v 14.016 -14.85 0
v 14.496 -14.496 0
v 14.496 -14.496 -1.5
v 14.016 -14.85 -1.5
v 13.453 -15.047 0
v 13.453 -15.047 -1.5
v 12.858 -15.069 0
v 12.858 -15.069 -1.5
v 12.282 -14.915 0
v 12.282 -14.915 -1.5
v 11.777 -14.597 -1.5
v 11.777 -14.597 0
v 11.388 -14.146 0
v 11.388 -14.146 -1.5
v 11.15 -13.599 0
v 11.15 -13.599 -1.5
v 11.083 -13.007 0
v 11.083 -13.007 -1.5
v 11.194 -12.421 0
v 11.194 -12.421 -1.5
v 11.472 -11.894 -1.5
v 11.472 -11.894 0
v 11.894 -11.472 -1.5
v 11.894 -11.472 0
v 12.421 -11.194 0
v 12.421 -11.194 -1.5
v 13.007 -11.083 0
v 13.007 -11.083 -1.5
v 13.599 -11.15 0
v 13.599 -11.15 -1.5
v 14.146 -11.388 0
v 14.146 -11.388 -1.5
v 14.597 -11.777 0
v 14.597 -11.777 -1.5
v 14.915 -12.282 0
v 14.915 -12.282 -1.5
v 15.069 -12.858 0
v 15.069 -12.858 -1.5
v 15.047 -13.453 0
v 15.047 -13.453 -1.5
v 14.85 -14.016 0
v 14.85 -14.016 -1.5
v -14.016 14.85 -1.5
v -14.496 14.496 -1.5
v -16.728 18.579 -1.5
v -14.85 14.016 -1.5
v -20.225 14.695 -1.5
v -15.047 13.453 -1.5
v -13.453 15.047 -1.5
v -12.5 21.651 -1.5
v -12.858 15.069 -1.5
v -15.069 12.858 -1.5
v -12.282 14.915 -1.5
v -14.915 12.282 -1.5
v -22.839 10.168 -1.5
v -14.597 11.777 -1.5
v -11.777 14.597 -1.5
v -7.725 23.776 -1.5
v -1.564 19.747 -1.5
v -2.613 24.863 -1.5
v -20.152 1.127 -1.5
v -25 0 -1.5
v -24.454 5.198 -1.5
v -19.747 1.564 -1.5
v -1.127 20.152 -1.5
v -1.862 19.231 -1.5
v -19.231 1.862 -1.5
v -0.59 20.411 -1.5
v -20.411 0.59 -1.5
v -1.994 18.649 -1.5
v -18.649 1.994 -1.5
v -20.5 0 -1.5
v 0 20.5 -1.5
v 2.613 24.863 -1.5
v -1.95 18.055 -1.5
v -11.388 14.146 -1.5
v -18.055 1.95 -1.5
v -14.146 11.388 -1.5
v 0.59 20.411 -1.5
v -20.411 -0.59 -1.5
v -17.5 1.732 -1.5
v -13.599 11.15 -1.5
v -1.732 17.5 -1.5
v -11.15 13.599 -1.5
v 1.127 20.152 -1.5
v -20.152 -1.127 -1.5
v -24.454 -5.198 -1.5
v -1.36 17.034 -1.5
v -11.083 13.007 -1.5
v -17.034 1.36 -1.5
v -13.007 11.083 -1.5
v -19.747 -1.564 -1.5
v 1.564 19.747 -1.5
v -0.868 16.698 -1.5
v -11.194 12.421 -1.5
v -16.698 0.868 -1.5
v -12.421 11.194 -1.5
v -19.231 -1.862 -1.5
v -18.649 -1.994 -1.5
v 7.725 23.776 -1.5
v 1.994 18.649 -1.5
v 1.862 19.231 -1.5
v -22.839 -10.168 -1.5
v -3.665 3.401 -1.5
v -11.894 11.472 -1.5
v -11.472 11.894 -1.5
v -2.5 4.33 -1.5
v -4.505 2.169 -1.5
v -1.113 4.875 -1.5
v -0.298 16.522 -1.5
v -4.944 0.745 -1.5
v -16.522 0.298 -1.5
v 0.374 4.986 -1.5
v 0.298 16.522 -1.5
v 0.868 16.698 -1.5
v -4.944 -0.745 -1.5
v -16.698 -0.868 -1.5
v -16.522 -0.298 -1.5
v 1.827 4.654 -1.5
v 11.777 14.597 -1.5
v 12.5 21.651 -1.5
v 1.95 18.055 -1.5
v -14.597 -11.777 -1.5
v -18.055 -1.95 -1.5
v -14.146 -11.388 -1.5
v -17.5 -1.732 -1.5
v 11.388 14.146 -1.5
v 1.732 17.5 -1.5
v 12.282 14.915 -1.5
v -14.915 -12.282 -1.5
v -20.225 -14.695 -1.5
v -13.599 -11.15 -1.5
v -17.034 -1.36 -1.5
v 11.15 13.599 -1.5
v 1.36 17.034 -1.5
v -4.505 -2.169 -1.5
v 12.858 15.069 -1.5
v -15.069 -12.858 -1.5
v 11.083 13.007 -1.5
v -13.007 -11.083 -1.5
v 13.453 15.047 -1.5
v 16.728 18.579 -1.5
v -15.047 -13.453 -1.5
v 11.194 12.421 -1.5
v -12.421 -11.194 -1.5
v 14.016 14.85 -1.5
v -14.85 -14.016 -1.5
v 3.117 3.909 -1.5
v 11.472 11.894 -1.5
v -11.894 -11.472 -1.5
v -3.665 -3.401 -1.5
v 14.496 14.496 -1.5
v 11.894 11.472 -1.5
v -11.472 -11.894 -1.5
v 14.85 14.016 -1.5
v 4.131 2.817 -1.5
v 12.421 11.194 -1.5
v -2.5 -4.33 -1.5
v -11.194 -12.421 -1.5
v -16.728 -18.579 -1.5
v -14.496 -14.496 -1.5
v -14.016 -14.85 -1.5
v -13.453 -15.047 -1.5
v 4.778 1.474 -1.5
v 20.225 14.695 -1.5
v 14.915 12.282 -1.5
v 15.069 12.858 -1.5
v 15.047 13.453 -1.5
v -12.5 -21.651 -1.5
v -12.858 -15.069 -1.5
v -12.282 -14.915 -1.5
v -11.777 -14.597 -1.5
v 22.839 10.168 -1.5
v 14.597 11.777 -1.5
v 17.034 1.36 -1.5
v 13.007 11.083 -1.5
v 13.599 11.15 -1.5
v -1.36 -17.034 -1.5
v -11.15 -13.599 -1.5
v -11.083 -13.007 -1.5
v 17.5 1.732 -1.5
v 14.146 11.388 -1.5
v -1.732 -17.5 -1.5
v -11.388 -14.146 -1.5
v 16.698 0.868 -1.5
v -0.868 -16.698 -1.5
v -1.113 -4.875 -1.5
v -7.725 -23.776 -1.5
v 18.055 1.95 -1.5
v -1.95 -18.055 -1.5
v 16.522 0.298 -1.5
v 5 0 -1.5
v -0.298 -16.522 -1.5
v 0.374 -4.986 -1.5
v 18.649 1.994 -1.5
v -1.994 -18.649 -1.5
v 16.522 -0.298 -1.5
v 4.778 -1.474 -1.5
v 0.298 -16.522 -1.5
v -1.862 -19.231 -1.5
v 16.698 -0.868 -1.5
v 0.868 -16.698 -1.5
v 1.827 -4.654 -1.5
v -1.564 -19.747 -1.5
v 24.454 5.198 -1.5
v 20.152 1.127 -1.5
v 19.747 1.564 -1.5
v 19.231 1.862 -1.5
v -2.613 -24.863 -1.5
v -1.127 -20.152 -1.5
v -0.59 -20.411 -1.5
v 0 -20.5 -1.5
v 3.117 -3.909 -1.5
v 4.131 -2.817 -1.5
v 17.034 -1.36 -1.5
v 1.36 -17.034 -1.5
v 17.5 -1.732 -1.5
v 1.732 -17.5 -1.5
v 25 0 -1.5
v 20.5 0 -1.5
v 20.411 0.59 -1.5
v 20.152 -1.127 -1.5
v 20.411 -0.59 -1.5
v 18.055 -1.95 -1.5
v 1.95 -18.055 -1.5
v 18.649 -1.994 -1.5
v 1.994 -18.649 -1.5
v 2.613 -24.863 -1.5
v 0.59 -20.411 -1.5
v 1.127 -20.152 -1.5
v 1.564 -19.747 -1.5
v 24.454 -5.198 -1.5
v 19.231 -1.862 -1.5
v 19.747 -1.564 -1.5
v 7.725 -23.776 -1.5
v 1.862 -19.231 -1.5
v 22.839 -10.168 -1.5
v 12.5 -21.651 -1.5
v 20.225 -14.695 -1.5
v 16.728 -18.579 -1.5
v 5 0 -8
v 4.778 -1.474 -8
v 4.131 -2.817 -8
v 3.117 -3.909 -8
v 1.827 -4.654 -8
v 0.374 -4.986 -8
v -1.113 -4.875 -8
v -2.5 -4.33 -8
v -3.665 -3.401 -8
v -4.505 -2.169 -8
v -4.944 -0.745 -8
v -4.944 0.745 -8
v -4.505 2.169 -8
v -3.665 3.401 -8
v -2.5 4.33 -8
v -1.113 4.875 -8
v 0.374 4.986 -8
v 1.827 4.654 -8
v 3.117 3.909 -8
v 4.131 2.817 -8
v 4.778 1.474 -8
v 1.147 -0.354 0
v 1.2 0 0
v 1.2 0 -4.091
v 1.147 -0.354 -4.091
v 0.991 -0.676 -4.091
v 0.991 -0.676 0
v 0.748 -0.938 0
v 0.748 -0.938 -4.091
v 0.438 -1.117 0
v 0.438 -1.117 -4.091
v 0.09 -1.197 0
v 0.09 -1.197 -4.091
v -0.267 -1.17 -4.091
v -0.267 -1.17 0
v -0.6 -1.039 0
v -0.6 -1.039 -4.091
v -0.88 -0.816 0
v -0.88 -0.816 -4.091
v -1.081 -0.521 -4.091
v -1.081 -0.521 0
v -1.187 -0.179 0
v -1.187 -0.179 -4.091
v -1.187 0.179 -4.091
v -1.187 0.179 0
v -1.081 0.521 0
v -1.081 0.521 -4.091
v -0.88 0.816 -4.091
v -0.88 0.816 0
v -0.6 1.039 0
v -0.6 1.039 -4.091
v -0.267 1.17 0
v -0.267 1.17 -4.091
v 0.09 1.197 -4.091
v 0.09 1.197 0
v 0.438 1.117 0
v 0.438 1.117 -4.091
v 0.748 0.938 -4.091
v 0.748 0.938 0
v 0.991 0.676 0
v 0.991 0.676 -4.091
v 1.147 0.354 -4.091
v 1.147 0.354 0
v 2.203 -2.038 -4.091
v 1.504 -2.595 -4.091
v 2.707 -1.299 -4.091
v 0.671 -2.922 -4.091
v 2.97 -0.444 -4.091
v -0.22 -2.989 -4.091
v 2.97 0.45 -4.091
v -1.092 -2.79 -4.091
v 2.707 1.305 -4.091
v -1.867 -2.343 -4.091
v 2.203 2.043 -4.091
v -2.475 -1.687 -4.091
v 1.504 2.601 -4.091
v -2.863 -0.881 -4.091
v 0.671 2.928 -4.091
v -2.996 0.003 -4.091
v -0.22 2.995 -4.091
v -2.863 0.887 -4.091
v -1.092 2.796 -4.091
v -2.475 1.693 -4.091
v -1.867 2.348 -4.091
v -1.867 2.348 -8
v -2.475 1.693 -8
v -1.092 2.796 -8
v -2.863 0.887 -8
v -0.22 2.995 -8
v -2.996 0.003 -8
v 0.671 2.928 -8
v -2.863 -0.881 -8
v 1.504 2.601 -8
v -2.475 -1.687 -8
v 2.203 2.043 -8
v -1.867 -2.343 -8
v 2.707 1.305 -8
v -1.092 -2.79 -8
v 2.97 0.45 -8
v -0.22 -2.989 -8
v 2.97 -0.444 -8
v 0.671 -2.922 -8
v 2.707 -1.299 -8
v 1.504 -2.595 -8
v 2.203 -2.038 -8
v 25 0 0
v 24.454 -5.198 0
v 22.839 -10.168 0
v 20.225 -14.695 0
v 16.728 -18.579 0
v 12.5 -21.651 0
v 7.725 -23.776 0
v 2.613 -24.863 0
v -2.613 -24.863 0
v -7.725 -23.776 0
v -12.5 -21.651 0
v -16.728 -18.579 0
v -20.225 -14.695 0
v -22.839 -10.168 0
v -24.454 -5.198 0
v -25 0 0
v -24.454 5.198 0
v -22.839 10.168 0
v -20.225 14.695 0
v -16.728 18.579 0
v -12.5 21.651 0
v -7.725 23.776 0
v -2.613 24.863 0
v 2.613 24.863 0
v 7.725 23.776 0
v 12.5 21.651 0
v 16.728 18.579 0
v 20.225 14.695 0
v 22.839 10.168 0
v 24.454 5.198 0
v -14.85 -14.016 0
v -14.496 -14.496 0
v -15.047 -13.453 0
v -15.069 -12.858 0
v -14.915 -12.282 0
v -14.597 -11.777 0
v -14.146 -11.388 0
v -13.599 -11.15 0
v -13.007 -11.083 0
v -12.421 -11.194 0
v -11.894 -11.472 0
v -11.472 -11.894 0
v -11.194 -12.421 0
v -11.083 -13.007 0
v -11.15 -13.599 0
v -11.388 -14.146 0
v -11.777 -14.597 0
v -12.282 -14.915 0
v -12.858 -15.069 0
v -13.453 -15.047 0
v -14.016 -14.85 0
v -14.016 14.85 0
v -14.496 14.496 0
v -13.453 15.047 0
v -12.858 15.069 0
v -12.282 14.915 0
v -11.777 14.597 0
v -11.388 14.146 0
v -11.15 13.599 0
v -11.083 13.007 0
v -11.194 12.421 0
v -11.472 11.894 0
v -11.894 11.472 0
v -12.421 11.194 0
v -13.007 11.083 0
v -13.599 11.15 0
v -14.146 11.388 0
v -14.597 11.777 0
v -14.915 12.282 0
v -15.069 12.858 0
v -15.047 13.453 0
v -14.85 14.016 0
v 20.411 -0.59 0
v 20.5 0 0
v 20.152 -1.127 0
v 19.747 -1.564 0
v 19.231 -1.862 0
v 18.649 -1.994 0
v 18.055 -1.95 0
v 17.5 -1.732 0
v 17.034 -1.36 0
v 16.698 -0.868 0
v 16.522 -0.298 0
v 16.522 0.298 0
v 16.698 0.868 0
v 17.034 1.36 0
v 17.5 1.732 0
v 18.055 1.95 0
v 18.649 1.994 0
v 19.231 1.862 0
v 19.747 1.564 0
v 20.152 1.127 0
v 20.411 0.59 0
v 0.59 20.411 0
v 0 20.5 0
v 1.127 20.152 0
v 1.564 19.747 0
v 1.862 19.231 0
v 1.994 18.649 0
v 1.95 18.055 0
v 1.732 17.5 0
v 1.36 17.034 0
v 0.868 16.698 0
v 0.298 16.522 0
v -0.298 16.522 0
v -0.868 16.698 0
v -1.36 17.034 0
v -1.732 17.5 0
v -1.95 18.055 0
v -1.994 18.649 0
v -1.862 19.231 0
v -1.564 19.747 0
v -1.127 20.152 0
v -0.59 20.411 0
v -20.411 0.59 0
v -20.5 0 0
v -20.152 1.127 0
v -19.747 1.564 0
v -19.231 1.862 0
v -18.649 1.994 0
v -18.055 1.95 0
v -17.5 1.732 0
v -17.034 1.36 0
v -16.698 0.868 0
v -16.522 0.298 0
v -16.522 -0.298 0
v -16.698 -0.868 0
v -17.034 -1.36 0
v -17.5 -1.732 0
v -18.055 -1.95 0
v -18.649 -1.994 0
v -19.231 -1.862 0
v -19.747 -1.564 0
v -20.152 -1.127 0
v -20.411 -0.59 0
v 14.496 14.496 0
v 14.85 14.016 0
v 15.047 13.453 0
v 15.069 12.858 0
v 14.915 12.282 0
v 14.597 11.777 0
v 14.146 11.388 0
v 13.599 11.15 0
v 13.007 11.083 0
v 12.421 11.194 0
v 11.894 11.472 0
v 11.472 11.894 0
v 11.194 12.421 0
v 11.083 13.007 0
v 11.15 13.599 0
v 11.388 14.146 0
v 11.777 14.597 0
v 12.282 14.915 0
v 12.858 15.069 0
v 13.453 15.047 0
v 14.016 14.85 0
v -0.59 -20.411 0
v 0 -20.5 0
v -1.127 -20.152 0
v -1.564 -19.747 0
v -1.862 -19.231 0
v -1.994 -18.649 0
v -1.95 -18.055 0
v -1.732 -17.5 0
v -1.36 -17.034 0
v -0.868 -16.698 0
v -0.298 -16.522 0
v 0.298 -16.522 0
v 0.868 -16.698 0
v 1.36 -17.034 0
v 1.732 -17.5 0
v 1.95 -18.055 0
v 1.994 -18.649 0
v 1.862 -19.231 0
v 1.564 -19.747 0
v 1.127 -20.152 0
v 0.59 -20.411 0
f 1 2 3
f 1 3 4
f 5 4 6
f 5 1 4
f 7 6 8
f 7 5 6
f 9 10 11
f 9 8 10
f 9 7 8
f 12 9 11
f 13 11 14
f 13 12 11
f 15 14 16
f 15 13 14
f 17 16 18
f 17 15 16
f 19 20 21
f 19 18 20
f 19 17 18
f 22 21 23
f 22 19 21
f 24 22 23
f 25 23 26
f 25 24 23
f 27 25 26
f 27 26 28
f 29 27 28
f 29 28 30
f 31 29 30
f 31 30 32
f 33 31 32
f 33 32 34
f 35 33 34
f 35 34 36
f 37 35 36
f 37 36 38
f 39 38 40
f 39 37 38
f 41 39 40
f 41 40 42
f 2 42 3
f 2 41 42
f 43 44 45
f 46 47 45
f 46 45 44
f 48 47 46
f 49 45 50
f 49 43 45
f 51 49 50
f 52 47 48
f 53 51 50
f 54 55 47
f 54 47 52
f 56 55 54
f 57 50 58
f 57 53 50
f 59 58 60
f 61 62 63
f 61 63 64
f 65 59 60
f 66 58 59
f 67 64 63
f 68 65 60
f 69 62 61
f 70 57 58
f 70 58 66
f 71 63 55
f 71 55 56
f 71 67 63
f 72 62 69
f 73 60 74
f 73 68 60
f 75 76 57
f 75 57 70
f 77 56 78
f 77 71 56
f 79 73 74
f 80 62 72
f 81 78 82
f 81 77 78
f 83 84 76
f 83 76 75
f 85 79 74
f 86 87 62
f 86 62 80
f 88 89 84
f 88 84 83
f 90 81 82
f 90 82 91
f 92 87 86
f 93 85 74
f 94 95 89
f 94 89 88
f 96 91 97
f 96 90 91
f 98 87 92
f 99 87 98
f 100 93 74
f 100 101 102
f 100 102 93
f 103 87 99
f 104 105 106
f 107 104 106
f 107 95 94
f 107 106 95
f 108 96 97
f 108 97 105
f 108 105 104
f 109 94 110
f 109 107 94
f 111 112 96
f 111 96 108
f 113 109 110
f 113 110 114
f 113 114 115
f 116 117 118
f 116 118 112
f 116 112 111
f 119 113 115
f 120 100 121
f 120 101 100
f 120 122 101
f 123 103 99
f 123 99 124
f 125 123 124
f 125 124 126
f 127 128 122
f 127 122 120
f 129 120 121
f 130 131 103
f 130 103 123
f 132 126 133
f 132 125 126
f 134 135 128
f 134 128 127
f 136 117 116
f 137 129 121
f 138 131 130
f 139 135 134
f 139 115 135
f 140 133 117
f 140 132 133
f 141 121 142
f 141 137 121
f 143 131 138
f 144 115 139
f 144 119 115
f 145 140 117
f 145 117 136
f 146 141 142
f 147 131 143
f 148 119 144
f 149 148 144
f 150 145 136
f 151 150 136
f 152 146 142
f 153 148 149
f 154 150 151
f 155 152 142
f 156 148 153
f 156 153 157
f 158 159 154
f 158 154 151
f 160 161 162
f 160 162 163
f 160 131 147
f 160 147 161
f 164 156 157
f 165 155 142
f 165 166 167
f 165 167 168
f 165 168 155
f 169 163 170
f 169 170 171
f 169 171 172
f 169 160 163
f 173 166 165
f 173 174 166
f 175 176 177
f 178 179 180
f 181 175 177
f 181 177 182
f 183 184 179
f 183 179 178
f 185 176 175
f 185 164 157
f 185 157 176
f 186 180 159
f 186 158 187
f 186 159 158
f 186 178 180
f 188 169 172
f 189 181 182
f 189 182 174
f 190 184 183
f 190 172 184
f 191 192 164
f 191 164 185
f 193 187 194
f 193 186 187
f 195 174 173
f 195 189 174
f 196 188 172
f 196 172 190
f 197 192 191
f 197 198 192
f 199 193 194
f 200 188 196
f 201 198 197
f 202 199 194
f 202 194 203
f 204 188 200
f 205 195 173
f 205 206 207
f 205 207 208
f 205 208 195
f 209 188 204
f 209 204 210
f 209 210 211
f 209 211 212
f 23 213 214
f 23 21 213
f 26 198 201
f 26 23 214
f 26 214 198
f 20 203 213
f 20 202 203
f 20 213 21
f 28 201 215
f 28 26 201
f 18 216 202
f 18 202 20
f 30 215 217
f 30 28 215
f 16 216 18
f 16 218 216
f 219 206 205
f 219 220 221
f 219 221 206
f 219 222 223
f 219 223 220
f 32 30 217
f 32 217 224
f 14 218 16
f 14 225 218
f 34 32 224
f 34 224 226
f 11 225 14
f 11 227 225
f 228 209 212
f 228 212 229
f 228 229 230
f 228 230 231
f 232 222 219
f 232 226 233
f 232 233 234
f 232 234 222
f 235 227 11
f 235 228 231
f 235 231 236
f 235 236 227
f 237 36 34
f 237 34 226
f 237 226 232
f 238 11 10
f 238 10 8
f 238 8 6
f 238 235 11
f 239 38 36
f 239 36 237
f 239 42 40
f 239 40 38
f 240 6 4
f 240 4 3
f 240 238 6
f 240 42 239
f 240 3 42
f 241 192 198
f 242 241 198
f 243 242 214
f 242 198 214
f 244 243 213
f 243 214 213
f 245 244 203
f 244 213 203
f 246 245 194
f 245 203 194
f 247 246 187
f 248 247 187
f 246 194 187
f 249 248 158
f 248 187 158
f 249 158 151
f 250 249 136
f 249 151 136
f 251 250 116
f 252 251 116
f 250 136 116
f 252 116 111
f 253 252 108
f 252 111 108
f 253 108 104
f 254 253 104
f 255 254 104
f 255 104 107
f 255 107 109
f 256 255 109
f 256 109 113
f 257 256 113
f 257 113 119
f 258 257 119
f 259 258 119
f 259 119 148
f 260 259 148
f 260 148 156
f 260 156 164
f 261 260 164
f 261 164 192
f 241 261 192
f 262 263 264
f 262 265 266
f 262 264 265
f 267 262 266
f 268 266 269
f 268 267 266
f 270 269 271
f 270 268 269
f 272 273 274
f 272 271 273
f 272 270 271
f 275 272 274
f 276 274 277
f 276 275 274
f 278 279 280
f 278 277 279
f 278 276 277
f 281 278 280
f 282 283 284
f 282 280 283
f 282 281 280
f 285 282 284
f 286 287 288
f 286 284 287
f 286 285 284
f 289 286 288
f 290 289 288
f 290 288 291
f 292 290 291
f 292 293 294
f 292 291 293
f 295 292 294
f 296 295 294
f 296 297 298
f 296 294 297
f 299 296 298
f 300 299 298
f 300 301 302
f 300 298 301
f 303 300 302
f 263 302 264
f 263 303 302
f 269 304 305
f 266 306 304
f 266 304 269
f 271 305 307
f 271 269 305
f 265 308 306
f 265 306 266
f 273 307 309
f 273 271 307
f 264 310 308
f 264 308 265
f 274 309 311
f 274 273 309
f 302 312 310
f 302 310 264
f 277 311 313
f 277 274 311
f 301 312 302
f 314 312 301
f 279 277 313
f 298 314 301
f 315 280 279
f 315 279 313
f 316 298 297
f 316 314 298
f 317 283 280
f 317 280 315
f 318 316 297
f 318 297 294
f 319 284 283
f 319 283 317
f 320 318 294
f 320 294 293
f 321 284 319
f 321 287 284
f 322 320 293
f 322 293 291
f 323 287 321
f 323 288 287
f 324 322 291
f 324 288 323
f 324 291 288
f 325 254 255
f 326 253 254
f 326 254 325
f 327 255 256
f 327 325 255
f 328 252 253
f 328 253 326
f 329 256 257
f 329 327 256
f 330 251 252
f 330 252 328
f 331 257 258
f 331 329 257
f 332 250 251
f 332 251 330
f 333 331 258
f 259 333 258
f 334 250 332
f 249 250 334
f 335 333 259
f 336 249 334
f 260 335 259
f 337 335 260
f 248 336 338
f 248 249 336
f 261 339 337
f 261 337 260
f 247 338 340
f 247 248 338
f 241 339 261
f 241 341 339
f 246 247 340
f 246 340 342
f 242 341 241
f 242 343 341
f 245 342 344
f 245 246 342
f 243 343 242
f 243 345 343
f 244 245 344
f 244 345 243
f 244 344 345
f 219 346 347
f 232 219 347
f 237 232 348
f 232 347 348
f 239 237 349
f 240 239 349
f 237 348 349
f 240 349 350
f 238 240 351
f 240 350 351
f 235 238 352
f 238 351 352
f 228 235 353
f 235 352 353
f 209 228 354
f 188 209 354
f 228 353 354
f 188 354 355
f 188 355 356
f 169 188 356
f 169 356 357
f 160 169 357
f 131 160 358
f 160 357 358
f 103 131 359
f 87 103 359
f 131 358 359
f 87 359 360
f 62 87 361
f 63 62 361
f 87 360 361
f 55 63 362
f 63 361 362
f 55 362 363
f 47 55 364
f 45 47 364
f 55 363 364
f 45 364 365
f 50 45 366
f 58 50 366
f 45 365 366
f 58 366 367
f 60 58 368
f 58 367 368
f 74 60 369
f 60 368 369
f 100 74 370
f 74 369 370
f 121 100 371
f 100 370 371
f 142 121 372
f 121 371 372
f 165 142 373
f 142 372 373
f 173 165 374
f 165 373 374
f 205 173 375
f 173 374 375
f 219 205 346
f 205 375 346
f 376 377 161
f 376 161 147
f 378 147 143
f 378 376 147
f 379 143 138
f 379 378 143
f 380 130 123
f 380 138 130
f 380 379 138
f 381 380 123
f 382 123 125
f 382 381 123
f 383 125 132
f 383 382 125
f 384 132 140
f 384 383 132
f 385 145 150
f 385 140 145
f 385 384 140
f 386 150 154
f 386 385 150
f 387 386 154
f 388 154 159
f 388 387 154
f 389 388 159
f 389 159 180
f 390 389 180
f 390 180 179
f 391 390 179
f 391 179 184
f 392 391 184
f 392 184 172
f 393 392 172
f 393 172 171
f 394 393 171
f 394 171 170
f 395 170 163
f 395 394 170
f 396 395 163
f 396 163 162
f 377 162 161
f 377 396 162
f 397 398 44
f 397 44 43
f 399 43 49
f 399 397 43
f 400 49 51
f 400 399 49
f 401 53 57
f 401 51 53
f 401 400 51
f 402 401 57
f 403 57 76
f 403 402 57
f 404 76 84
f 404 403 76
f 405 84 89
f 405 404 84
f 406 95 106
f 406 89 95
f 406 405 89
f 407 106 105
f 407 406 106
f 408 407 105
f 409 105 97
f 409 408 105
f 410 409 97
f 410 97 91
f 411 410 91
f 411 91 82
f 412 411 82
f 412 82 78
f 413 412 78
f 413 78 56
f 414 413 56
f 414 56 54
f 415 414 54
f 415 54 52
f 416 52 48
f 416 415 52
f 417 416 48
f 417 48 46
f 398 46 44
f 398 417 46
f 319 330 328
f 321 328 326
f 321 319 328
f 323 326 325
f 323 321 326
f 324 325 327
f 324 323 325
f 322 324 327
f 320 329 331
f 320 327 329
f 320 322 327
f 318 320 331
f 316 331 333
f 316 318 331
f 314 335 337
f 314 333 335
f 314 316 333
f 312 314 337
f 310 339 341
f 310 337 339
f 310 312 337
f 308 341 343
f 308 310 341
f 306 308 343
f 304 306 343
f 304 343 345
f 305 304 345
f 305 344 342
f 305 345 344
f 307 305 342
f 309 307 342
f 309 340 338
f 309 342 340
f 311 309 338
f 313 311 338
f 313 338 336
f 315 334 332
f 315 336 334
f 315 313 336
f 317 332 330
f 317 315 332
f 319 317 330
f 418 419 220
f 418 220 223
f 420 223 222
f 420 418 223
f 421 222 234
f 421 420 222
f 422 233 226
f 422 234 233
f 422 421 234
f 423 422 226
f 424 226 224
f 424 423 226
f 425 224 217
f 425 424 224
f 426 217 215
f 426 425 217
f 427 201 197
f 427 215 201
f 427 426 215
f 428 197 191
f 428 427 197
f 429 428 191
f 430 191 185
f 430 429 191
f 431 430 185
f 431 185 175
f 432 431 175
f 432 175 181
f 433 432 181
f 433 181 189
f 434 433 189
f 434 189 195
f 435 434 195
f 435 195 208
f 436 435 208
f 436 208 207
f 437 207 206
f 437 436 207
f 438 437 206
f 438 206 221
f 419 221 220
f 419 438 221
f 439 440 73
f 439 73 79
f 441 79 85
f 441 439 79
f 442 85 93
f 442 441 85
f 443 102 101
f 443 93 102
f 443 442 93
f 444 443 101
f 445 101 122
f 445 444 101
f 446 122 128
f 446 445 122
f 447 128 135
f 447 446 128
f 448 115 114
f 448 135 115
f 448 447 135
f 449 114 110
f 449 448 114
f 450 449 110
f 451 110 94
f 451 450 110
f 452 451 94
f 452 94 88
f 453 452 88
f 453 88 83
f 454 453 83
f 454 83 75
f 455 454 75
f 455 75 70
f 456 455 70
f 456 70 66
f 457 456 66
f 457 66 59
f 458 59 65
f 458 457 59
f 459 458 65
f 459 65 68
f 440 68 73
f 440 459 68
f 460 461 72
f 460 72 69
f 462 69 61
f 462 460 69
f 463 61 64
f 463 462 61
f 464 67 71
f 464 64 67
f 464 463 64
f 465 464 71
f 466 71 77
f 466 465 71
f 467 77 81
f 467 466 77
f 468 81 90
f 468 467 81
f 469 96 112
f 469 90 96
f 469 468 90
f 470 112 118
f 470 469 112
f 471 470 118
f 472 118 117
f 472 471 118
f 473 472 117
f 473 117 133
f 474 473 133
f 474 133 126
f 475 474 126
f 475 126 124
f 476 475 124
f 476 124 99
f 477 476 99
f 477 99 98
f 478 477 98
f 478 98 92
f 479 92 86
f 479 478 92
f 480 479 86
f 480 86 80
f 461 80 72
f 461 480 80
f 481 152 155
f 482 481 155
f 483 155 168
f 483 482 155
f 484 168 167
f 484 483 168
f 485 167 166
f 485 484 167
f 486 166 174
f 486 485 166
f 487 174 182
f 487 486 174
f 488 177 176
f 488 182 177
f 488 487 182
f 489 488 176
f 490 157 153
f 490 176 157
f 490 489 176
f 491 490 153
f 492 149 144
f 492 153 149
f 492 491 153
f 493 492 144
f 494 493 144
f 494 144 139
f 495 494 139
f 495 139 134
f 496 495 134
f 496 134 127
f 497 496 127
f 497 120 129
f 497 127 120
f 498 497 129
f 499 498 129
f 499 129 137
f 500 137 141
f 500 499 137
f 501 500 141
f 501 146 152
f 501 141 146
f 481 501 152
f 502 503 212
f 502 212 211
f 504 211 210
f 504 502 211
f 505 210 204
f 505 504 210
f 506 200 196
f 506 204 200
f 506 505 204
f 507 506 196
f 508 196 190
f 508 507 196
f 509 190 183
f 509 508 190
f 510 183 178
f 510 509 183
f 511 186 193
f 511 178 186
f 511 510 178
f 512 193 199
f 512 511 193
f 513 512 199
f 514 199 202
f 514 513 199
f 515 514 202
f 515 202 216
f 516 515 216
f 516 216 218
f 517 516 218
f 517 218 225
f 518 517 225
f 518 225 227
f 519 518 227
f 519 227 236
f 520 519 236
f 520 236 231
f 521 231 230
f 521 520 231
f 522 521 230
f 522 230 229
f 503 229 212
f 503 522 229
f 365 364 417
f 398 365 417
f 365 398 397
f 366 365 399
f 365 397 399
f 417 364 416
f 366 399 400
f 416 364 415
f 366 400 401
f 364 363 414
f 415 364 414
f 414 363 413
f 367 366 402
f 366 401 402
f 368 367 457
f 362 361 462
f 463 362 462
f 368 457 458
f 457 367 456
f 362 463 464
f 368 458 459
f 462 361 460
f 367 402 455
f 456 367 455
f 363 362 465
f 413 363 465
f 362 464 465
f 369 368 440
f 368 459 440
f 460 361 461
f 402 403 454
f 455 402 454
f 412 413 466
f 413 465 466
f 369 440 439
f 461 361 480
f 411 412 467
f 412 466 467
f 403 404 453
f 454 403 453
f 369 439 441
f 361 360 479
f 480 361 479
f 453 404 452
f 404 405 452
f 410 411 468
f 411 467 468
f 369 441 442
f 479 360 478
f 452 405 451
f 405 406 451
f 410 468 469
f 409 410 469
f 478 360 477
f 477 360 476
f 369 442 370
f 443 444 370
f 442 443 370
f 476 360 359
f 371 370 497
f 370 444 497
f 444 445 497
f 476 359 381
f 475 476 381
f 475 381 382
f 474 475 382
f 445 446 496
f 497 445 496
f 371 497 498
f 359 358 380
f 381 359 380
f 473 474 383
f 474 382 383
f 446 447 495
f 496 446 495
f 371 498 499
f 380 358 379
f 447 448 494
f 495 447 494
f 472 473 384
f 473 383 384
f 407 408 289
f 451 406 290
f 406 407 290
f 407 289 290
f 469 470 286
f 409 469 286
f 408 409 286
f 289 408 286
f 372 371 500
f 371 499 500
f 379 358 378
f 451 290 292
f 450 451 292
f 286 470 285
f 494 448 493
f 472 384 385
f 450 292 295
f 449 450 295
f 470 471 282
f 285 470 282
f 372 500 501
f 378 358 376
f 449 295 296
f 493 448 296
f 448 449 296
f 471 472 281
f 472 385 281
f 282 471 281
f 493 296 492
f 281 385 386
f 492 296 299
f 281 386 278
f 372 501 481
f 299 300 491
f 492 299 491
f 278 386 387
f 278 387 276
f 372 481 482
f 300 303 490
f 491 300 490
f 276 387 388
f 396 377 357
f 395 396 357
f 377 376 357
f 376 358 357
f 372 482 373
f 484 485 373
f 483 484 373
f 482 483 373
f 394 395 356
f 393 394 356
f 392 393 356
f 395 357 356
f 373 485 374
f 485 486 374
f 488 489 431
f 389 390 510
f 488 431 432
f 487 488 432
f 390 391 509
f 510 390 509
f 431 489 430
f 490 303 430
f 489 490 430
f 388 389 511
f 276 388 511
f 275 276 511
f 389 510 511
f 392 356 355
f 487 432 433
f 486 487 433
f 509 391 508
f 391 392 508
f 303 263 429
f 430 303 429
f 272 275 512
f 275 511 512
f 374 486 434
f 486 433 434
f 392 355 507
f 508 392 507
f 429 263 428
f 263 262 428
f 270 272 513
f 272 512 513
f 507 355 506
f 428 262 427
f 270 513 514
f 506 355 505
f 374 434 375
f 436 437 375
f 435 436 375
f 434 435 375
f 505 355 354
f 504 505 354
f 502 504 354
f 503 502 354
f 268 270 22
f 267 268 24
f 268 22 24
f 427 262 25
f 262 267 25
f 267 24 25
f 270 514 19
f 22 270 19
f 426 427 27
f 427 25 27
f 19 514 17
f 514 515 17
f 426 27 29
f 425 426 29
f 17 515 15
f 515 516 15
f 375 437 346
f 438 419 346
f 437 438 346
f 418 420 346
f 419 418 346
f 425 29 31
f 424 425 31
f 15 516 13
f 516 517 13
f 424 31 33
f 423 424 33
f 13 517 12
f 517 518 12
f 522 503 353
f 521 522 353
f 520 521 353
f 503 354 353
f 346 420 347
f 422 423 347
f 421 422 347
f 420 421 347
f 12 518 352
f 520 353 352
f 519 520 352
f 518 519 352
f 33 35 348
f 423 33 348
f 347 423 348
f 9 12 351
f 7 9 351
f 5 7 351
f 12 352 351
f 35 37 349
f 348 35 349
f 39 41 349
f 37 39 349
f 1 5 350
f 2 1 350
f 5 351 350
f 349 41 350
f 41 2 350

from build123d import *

# Parameters (mm, degrees)
SKETCH002_R                 = 3
EXTRUDE002_DEPTH            = 6
CYLINDER049_R               = 1.2
CYLINDER049_DEPTH           = 19
CYLINDER014_R               = 2
CYLINDER014_DEPTH           = 5
CYLINDER014_PLACEMENT_ANGLE = 45
CYLINDER015_R               = 2
CYLINDER015_DEPTH           = 5
CYLINDER016_R               = 2
CYLINDER016_DEPTH           = 5
CYLINDER016_PLACEMENT_ANGLE = 135
CYLINDER017_R               = 2
CYLINDER017_DEPTH           = 5
CYLINDER018_R               = 2
CYLINDER018_DEPTH           = 5
CYLINDER018_PLACEMENT_ANGLE = 225
CYLINDER019_R               = 2
CYLINDER019_DEPTH           = 5
CYLINDER020_R               = 2
CYLINDER020_DEPTH           = 5
CYLINDER020_PLACEMENT_ANGLE = 45
CYLINDER013_R               = 2
CYLINDER013_DEPTH           = 5
CYLINDER021_R               = 5
CYLINDER021_DEPTH           = 8
CYLINDER012_R               = 25
CYLINDER012_DEPTH           = 1.5
CUT050_PLACEMENT_ANGLE      = 180


with BuildPart() as extrude002:
    # Sketch002 (on Face25 of Shape005) → Extrude002 (new body)
    with BuildSketch(Plane(origin=(85.664098, -4.553146, 1.091283), x_dir=(-1, 0, 0), z_dir=(0, 0, 1))):
        with Locations((9.450198, -0.000218)):
            Circle(SKETCH002_R)
    extrude(amount=EXTRUDE002_DEPTH)


with BuildPart() as extrude002_1:
    # Extrude002 placement: moved
    add(extrude002.part.moved(Location((-76.21, 4.55, 3))))


with BuildPart() as cylinder049:
    # Cylinder049 → Cylinder049 (new body)
    with BuildSketch(Plane.XY.offset(-1)):
        Circle(CYLINDER049_R)
    extrude(amount=CYLINDER049_DEPTH)


with BuildPart() as cylinder014:
    # cylinder014 → cylinder014 (new body)
    with BuildSketch(Plane.XY):
        Circle(CYLINDER014_R)
    extrude(amount=CYLINDER014_DEPTH)


with BuildPart() as cylinder014_1:
    # cylinder014 placement: moved
    add(cylinder014.part.moved(Location((13.081475, 13.081475, 0))).rotate(Axis((13.081475, 13.081475, 0), (0, 0, 1)), CYLINDER014_PLACEMENT_ANGLE))


with BuildPart() as cylinder015:
    # cylinder015 → cylinder015 (new body)
    with BuildSketch(Plane(origin=(0, 18.5, 0), x_dir=(0, 1, 0), z_dir=(0, 0, 1))):
        Circle(CYLINDER015_R)
    extrude(amount=CYLINDER015_DEPTH)


with BuildPart() as cylinder016:
    # cylinder016 → cylinder016 (new body)
    with BuildSketch(Plane.XY):
        Circle(CYLINDER016_R)
    extrude(amount=CYLINDER016_DEPTH)


with BuildPart() as cylinder016_1:
    # cylinder016 placement: moved
    add(cylinder016.part.moved(Location((-13.081475, 13.081475, 0))).rotate(Axis((-13.081475, 13.081475, 0), (0, 0, 1)), CYLINDER016_PLACEMENT_ANGLE))


with BuildPart() as cylinder017:
    # cylinder017 → cylinder017 (new body)
    with BuildSketch(Plane(origin=(-18.5, 0, 0), x_dir=(-1, 0, 0), z_dir=(0, 0, 1))):
        Circle(CYLINDER017_R)
    extrude(amount=CYLINDER017_DEPTH)


with BuildPart() as cylinder018:
    # cylinder018 → cylinder018 (new body)
    with BuildSketch(Plane.XY):
        Circle(CYLINDER018_R)
    extrude(amount=CYLINDER018_DEPTH)


with BuildPart() as cylinder018_1:
    # cylinder018 placement: moved
    add(cylinder018.part.moved(Location((-13.081475, -13.081475, 0))).rotate(Axis((-13.081475, -13.081475, 0), (0, 0, 1)), CYLINDER018_PLACEMENT_ANGLE))


with BuildPart() as cylinder019:
    # cylinder019 → cylinder019 (new body)
    with BuildSketch(Plane(origin=(0, -18.5, 0), x_dir=(0, -1, 0), z_dir=(0, 0, 1))):
        Circle(CYLINDER019_R)
    extrude(amount=CYLINDER019_DEPTH)


with BuildPart() as cylinder020:
    # cylinder020 → cylinder020 (new body)
    with BuildSketch(Plane.XY):
        Circle(CYLINDER020_R)
    extrude(amount=CYLINDER020_DEPTH)


with BuildPart() as cylinder020_1:
    # cylinder020 placement: moved
    add(cylinder020.part.moved(Location((13.081475, -13.081475, 0))).rotate(Axis((13.081475, -13.081475, 0), (0, 0, -1)), CYLINDER020_PLACEMENT_ANGLE))


with BuildPart() as fusion026:
    # cylinder013 → cylinder013 (new body)
    with BuildSketch(Plane(origin=(18.5, 0, 0), x_dir=(1, 0, 0), z_dir=(0, 0, 1))):
        Circle(CYLINDER013_R)
    extrude(amount=CYLINDER013_DEPTH)

    # Group001: union cylinder014, cylinder015, cylinder016, cylinder017, cylinder018, cylinder019, cylinder020
    add(cylinder014_1.part)
    add(cylinder015.part)
    add(cylinder016_1.part)
    add(cylinder017.part)
    add(cylinder018_1.part)
    add(cylinder019.part)
    add(cylinder020_1.part)


with BuildPart() as fusion026_1:
    # Group001 placement: moved
    add(fusion026.part.moved(Location((0, 0, -1))))

    # Fusion026: union Extrude002, Cylinder049
    add(extrude002_1.part)
    add(cylinder049.part)


with BuildPart() as servo_central_shaft002:
    # cylinder021 → cylinder021 (new body)
    with BuildSketch(Plane.XY):
        Circle(CYLINDER021_R)
    extrude(amount=CYLINDER021_DEPTH)


with BuildPart() as rotor001:
    # cylinder012 → cylinder012 (new body)
    with BuildSketch(Plane.XY):
        Circle(CYLINDER012_R)
    extrude(amount=CYLINDER012_DEPTH)

    # Fusion027: union servo_central_shaft002
    add(servo_central_shaft002.part)

    # Cut050: cut Fusion026
    add(fusion026_1.part, mode=Mode.SUBTRACT)


with BuildPart() as rotor001_1:
    # Cut050 placement: moved
    add(rotor001.part.rotate(Axis((0, 0, 0), (1, 0, 0)), CUT050_PLACEMENT_ANGLE))


solid = rotor001_1.part
